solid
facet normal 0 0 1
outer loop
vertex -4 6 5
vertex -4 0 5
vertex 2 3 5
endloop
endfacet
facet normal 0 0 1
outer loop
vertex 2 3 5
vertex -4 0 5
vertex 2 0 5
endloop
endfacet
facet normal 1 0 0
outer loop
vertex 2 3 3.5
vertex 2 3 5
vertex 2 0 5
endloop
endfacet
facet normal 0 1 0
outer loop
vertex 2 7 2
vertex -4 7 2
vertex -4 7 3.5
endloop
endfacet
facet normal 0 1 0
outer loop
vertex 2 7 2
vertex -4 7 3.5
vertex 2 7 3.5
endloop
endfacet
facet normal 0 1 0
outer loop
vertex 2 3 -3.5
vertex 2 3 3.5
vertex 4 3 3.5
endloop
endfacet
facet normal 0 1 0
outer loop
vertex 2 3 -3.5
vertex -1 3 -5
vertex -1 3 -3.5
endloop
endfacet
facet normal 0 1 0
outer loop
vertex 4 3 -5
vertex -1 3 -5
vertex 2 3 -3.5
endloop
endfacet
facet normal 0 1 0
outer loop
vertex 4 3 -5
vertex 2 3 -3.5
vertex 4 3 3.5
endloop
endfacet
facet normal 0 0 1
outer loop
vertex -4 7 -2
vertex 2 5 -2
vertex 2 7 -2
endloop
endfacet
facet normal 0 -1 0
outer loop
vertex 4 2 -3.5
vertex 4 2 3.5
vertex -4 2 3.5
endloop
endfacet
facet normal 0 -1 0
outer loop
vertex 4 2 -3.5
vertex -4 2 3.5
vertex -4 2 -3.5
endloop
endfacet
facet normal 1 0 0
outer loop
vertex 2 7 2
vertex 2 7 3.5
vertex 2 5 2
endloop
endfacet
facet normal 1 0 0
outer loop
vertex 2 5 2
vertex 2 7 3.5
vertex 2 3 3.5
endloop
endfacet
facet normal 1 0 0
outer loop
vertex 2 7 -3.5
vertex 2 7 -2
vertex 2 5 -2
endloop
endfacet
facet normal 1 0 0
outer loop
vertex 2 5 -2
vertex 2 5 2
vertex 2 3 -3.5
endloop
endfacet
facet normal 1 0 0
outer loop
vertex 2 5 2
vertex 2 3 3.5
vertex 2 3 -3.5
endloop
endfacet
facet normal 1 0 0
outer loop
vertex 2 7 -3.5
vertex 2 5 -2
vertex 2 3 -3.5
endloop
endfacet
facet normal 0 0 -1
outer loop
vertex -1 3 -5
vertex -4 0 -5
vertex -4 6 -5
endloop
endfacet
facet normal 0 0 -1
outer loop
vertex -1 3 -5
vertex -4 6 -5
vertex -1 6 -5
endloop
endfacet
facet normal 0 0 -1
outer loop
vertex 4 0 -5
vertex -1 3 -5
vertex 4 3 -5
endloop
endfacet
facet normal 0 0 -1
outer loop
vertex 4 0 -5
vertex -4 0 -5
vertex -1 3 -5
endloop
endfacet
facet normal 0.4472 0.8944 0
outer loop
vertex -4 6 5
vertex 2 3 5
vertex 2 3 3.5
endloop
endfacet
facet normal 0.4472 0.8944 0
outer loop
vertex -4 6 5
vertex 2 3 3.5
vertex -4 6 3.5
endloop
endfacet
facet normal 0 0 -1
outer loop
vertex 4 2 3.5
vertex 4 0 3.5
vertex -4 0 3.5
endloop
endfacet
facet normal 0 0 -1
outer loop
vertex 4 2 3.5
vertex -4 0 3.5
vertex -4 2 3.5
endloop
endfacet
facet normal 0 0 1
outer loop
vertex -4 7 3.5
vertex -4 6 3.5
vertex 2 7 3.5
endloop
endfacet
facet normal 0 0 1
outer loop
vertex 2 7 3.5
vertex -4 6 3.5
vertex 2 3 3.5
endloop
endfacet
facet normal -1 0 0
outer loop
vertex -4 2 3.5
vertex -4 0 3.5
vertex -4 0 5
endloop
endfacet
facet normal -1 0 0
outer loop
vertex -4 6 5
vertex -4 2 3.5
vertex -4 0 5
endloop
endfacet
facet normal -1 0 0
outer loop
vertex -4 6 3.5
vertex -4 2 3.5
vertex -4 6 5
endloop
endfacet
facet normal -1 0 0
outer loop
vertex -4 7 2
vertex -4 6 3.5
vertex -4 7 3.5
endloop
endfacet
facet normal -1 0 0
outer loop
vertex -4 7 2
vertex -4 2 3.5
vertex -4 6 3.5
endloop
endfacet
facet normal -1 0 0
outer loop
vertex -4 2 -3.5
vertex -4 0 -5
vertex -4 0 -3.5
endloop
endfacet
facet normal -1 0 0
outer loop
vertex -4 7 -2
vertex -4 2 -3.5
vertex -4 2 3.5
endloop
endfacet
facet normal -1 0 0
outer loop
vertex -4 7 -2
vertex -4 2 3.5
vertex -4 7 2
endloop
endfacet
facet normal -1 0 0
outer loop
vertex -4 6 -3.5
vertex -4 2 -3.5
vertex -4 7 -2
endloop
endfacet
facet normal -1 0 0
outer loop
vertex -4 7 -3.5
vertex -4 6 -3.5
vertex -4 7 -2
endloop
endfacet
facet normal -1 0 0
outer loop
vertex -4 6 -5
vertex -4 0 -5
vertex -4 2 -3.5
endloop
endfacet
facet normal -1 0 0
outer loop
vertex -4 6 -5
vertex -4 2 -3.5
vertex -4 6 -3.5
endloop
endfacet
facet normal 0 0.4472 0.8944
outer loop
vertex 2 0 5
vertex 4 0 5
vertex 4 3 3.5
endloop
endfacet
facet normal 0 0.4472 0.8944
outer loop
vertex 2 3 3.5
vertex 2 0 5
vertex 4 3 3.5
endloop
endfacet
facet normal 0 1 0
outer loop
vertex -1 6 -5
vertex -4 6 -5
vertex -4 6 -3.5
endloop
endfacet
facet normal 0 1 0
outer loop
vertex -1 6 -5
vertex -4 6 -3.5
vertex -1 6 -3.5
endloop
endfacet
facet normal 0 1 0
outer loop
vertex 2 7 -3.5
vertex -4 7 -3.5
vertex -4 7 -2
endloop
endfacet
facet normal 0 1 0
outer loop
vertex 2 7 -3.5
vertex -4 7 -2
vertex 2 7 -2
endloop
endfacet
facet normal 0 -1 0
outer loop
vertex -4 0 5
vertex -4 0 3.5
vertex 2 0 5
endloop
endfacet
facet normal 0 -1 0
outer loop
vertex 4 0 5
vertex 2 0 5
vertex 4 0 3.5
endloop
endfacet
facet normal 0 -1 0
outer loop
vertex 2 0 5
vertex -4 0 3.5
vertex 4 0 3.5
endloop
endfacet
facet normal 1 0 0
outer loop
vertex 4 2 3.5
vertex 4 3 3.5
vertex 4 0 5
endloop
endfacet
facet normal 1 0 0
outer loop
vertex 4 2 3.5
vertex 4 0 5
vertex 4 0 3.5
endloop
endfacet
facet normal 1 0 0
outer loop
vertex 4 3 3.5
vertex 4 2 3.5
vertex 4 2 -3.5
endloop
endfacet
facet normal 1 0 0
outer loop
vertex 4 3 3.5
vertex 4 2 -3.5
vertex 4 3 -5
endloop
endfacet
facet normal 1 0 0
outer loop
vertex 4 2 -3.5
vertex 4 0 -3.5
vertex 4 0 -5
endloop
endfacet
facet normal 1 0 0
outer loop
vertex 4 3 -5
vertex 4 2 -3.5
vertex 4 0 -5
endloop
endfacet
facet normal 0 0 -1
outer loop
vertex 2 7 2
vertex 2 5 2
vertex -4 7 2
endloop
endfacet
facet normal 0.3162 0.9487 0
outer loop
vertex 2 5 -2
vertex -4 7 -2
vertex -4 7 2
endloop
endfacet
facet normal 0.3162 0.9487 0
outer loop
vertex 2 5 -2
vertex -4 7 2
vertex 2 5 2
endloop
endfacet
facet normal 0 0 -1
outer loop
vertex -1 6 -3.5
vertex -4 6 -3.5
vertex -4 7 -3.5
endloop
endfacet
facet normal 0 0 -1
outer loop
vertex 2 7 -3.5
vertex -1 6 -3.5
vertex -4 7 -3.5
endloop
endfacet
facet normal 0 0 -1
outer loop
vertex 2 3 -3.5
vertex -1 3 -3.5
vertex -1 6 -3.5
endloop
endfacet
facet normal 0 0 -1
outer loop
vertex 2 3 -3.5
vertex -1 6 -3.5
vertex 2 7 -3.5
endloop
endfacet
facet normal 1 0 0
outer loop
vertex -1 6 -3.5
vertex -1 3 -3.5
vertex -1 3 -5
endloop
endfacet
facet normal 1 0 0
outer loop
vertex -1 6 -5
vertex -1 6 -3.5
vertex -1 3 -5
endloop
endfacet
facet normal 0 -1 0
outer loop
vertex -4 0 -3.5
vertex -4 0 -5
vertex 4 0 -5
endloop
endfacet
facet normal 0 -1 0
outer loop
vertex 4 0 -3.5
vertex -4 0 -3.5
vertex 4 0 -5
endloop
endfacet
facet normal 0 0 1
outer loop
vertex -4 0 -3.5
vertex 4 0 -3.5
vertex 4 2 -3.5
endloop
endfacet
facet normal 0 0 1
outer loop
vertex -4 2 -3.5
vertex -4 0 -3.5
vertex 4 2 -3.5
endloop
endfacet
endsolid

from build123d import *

# Parameters (mm, degrees)
CROQUIS1_W              = 8
CROQUIS1_H              = 10
SALIENTE_EXTRUIR1_DEPTH = 3
CROQUIS2_W              = 7
CROQUIS2_H              = 2
CORTAR_EXTRUIR1_DEPTH   = 9
CROQUIS5_W              = 6
CROQUIS5_H              = 7
SALIENTE_EXTRUIR2_DEPTH = 4
CROQUIS6_W              = 6
CROQUIS6_H              = 1.5
SALIENTE_EXTRUIR3_DEPTH = 3
CORTAR_EXTRUIR2_DEPTH   = 1.5
CORTAR_EXTRUIR3_DEPTH   = 2
CROQUIS9_W              = 3
CROQUIS9_H              = 1.5
SALIENTE_EXTRUIR4_DEPTH = 3
CROQUIS10_W             = 4
CROQUIS10_H             = 2
CORTAR_EXTRUIR4_DEPTH   = 7
SALIENTE_EXTRUIR5_DEPTH = 4


with BuildPart() as part:
    # Croquis1 → Saliente-Extruir1 (new body)
    with BuildSketch(Plane(origin=(0, 0, 0), x_dir=(1, 0, 0), z_dir=(0, 1, 0))):
        Rectangle(CROQUIS1_W, CROQUIS1_H)
    extrude(amount=SALIENTE_EXTRUIR1_DEPTH)

    # Croquis2 → Cortar-Extruir1 (cut, through all)
    with BuildSketch(Plane(origin=(4, 0, 0), x_dir=(0, 0, -1), z_dir=(1, 0, 0))):
        with Locations((0, 1)):
            Rectangle(CROQUIS2_W, CROQUIS2_H)
    extrude(amount=-CORTAR_EXTRUIR1_DEPTH, mode=Mode.SUBTRACT)

    # Croquis5 → Saliente-Extruir2 (add)
    with BuildSketch(Plane(origin=(0, 3, 0), x_dir=(1, 0, 0), z_dir=(0, 1, 0))):
        with Locations((-1, 0)):
            Rectangle(CROQUIS5_W, CROQUIS5_H)
    extrude(amount=SALIENTE_EXTRUIR2_DEPTH)

    # Croquis6 → Saliente-Extruir3 (add)
    with BuildSketch(Plane(origin=(0, 3, 0), x_dir=(1, 0, 0), z_dir=(0, 1, 0))):
        with Locations((-1, -4.25)):
            Rectangle(CROQUIS6_W, CROQUIS6_H)
    extrude(amount=SALIENTE_EXTRUIR3_DEPTH)

    # Croquis7 → Cortar-Extruir2 (cut)
    with BuildSketch(Plane.XY.offset(5)):
        Polygon((2, 3), (-4, 6), (2, 6), align=None)
    extrude(amount=-CORTAR_EXTRUIR2_DEPTH, mode=Mode.SUBTRACT)

    # Croquis8 → Cortar-Extruir3 (cut)
    with BuildSketch(Plane(origin=(4, 0, 0), x_dir=(0, 0, -1), z_dir=(1, 0, 0))):
        Polygon((-3.5, 3), (-5, 3), (-5, 0), align=None)
    extrude(amount=-CORTAR_EXTRUIR3_DEPTH, mode=Mode.SUBTRACT)

    # Croquis9 → Saliente-Extruir4 (add)
    with BuildSketch(Plane(origin=(0, 3, 0), x_dir=(1, 0, 0), z_dir=(0, 1, 0))):
        with Locations((-2.5, 4.25)):
            Rectangle(CROQUIS9_W, CROQUIS9_H)
    extrude(amount=SALIENTE_EXTRUIR4_DEPTH)

    # Croquis10 → Cortar-Extruir4 (cut, through all)
    with BuildSketch(Plane(origin=(2, 0, 0), x_dir=(0, 0, -1), z_dir=(1, 0, 0))):
        with Locations((0, 6)):
            Rectangle(CROQUIS10_W, CROQUIS10_H)
    extrude(amount=-CORTAR_EXTRUIR4_DEPTH, mode=Mode.SUBTRACT)

    # Croquis11 → Saliente-Extruir5 (add)
    with BuildSketch(Plane.XY.offset(-2)):
        Polygon((2, 5), (-4, 5), (-4, 7), align=None)
    extrude(amount=SALIENTE_EXTRUIR5_DEPTH)


solid = part.part
